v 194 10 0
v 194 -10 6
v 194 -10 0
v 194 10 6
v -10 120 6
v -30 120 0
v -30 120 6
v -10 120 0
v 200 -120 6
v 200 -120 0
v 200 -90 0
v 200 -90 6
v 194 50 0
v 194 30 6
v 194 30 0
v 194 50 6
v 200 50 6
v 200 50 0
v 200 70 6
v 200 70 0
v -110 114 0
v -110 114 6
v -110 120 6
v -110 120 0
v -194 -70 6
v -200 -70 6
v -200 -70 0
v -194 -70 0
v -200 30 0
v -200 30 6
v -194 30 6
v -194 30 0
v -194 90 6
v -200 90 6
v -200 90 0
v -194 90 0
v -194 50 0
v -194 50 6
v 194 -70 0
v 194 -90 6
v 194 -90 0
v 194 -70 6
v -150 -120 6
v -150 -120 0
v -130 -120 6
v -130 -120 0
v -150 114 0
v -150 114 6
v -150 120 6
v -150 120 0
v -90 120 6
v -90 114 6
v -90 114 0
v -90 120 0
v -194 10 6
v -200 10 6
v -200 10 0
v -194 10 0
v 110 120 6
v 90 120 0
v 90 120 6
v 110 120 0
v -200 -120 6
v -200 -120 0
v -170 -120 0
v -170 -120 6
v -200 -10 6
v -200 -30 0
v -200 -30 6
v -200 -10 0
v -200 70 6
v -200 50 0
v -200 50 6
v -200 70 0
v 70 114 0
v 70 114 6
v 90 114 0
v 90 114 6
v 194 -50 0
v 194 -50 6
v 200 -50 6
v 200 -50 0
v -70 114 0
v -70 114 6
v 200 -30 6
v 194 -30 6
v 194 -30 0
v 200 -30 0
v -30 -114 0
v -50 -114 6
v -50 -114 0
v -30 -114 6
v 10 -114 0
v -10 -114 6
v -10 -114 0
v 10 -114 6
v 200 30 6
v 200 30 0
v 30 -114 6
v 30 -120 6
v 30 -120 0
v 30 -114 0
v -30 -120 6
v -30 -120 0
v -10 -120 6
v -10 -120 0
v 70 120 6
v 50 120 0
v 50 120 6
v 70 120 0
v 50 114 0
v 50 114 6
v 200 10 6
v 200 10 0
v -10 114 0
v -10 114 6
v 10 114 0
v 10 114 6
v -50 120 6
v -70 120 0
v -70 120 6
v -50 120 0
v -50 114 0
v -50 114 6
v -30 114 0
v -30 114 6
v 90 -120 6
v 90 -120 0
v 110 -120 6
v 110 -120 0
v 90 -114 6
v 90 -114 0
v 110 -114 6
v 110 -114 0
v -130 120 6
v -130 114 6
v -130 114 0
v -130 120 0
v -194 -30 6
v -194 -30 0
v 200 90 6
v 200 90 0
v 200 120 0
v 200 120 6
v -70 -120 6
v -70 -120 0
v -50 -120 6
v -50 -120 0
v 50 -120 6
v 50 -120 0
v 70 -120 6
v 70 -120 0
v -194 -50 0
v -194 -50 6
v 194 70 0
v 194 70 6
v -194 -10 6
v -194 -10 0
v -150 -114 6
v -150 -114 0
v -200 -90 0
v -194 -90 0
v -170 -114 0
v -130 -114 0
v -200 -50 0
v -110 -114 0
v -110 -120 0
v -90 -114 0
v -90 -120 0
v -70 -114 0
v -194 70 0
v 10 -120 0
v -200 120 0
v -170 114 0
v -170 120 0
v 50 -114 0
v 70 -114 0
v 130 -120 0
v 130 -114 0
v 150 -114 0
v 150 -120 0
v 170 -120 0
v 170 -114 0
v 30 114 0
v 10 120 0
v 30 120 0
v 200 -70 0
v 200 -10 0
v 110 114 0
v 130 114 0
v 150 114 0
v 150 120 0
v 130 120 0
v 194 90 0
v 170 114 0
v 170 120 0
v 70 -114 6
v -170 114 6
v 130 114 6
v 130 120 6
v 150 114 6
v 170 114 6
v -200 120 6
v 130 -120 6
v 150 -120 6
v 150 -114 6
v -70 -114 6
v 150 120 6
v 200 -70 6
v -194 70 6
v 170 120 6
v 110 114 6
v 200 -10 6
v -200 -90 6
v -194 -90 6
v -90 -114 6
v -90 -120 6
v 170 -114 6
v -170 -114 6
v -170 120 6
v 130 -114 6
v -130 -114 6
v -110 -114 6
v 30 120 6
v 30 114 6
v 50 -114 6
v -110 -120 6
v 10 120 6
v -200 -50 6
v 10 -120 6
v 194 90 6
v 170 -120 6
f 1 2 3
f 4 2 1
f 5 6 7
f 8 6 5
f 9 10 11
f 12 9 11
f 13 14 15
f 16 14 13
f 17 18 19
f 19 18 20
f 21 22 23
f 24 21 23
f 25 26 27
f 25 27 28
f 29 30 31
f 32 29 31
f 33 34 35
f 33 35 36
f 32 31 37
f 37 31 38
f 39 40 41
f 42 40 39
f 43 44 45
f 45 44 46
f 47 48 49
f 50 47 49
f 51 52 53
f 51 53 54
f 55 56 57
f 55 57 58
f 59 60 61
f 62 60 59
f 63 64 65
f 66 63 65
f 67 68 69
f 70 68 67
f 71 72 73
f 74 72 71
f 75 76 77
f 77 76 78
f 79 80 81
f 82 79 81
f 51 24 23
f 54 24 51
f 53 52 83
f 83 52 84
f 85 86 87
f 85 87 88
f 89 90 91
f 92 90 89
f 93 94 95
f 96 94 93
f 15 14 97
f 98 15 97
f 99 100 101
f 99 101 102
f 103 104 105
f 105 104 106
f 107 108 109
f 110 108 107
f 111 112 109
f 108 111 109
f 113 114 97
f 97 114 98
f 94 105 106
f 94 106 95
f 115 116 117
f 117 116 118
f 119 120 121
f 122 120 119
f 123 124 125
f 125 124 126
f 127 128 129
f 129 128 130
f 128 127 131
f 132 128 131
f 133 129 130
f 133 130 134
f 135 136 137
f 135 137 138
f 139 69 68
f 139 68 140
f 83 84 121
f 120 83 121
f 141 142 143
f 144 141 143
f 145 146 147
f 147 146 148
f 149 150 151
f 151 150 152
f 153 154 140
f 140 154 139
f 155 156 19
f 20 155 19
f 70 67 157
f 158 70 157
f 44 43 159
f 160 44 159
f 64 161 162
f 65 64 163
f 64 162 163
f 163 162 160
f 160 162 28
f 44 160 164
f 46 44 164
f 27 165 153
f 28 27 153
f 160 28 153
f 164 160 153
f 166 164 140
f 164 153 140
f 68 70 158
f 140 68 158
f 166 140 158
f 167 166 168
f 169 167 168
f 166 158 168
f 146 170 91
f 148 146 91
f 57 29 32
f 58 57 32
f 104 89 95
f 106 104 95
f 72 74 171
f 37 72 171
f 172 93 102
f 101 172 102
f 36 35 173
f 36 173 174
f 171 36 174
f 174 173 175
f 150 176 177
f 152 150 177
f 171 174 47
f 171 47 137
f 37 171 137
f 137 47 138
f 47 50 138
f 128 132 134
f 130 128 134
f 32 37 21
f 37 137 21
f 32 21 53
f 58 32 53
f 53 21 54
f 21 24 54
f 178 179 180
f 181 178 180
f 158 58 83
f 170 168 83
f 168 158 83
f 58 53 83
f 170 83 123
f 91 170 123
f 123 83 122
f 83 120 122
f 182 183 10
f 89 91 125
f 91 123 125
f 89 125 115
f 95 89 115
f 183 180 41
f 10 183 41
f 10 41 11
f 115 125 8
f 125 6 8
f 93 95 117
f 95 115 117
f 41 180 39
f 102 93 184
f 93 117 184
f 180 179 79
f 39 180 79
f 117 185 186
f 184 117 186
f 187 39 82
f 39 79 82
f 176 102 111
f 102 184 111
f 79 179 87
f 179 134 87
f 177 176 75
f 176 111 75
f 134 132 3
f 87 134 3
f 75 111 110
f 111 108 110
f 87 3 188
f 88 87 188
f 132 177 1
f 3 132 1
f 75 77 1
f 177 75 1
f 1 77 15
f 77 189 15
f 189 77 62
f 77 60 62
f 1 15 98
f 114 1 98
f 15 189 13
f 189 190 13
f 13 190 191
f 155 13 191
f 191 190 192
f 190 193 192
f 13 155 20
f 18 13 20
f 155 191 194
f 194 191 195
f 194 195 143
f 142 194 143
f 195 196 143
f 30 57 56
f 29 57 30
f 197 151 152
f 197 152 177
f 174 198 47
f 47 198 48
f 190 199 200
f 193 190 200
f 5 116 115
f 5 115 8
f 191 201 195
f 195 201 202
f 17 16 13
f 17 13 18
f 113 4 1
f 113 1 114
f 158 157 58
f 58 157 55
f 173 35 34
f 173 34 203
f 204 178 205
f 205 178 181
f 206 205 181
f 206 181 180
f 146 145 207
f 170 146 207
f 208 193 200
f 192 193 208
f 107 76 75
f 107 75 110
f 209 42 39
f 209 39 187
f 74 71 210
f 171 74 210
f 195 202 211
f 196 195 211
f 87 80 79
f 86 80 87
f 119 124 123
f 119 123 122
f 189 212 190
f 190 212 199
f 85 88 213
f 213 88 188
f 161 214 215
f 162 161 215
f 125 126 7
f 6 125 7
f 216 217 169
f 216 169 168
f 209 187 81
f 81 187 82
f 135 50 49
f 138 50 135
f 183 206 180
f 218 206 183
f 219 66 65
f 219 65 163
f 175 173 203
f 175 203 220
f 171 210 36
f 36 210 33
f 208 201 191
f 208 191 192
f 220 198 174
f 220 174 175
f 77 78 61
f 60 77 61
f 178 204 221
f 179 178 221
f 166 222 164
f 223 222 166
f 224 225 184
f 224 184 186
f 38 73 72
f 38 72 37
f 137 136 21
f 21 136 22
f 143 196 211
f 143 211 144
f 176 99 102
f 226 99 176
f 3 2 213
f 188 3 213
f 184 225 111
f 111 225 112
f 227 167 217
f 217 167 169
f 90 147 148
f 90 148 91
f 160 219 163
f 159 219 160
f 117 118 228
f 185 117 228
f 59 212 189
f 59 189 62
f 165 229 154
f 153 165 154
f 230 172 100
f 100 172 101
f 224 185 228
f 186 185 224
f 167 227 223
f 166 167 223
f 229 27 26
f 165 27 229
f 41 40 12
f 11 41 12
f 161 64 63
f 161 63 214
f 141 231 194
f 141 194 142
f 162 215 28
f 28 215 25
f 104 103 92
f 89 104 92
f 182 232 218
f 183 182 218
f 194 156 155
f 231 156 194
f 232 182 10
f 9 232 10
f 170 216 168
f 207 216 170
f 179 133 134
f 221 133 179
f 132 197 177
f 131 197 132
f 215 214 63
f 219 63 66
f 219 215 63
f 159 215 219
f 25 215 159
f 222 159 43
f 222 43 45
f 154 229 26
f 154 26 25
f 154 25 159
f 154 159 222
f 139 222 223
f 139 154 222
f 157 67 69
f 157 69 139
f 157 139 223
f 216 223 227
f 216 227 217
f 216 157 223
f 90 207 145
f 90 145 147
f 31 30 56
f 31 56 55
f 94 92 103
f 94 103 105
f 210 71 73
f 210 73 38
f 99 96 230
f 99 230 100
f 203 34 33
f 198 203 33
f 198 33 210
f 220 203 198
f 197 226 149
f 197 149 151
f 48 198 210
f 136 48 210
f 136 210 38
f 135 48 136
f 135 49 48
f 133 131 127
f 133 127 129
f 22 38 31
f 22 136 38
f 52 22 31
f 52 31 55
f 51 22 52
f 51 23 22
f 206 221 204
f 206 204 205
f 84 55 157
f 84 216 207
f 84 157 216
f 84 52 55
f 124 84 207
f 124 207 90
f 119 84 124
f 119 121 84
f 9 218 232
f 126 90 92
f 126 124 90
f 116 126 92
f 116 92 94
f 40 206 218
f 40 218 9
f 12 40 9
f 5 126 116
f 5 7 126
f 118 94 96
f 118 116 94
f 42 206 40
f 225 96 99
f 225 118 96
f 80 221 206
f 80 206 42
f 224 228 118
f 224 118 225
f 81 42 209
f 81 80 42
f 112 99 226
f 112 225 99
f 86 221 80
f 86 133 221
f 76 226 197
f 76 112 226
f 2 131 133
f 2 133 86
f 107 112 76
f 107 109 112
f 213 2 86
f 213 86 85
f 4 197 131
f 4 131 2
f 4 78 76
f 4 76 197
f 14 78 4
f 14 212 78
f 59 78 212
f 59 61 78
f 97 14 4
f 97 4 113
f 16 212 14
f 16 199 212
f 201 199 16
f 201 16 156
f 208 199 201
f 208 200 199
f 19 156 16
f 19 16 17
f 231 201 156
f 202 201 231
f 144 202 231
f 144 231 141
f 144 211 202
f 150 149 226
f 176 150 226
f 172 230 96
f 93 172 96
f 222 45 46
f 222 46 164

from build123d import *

# Parameters (mm, degrees)
F0_W     = 400
F0_H     = 240
F1_DEPTH = 6
F2_W     = 6
F2_H     = 20
F2_W_2   = 20
F2_H_2   = 6
F3_DEPTH = 25


with BuildPart() as f1:
    # F0 (on Top) → F1 (new body)
    with BuildSketch(Plane.XY):
        Rectangle(F0_W, F0_H)
    extrude(amount=F1_DEPTH)

    # F2 (on face) → F3 (cut)
    with BuildSketch(Plane.XY.offset(6)):
        with Locations((-197, 80)):
            Rectangle(F2_W, F2_H)
        with Locations((-197, 40)):
            Rectangle(F2_W, F2_H)
        with Locations((-197, -40)):
            Rectangle(F2_W, F2_H)
        with Locations((-197, 0)):
            Rectangle(F2_W, F2_H)
        with Locations((-197, -80)):
            Rectangle(F2_W, F2_H)
        with Locations((-160, 117)):
            Rectangle(F2_W_2, F2_H_2)
        with Locations((-120, 117)):
            Rectangle(F2_W_2, F2_H_2)
        with Locations((-80, 117)):
            Rectangle(F2_W_2, F2_H_2)
        with Locations((-40, 117)):
            Rectangle(F2_W_2, F2_H_2)
        with Locations((0, 117)):
            Rectangle(F2_W_2, F2_H_2)
        with Locations((40, 117)):
            Rectangle(F2_W_2, F2_H_2)
        with Locations((80, 117)):
            Rectangle(F2_W_2, F2_H_2)
        with Locations((120, 117)):
            Rectangle(F2_W_2, F2_H_2)
        with Locations((160, 117)):
            Rectangle(F2_W_2, F2_H_2)
        with Locations((197, 80)):
            Rectangle(F2_W, F2_H)
        with Locations((197, 40)):
            Rectangle(F2_W, F2_H)
        with Locations((197, 0)):
            Rectangle(F2_W, F2_H)
        with Locations((197, -40)):
            Rectangle(F2_W, F2_H)
        with Locations((197, -80)):
            Rectangle(F2_W, F2_H)
        with Locations((-160, -117)):
            Rectangle(F2_W_2, F2_H_2)
        with Locations((-120, -117)):
            Rectangle(F2_W_2, F2_H_2)
        with Locations((-80, -117)):
            Rectangle(F2_W_2, F2_H_2)
        with Locations((-40, -117)):
            Rectangle(F2_W_2, F2_H_2)
        with Locations((0, -117)):
            Rectangle(F2_W_2, F2_H_2)
        with Locations((40, -117)):
            Rectangle(F2_W_2, F2_H_2)
        with Locations((80, -117)):
            Rectangle(F2_W_2, F2_H_2)
        with Locations((120, -117)):
            Rectangle(F2_W_2, F2_H_2)
        with Locations((160, -117)):
            Rectangle(F2_W_2, F2_H_2)
    extrude(amount=-F3_DEPTH, mode=Mode.SUBTRACT)


solid = f1.part
